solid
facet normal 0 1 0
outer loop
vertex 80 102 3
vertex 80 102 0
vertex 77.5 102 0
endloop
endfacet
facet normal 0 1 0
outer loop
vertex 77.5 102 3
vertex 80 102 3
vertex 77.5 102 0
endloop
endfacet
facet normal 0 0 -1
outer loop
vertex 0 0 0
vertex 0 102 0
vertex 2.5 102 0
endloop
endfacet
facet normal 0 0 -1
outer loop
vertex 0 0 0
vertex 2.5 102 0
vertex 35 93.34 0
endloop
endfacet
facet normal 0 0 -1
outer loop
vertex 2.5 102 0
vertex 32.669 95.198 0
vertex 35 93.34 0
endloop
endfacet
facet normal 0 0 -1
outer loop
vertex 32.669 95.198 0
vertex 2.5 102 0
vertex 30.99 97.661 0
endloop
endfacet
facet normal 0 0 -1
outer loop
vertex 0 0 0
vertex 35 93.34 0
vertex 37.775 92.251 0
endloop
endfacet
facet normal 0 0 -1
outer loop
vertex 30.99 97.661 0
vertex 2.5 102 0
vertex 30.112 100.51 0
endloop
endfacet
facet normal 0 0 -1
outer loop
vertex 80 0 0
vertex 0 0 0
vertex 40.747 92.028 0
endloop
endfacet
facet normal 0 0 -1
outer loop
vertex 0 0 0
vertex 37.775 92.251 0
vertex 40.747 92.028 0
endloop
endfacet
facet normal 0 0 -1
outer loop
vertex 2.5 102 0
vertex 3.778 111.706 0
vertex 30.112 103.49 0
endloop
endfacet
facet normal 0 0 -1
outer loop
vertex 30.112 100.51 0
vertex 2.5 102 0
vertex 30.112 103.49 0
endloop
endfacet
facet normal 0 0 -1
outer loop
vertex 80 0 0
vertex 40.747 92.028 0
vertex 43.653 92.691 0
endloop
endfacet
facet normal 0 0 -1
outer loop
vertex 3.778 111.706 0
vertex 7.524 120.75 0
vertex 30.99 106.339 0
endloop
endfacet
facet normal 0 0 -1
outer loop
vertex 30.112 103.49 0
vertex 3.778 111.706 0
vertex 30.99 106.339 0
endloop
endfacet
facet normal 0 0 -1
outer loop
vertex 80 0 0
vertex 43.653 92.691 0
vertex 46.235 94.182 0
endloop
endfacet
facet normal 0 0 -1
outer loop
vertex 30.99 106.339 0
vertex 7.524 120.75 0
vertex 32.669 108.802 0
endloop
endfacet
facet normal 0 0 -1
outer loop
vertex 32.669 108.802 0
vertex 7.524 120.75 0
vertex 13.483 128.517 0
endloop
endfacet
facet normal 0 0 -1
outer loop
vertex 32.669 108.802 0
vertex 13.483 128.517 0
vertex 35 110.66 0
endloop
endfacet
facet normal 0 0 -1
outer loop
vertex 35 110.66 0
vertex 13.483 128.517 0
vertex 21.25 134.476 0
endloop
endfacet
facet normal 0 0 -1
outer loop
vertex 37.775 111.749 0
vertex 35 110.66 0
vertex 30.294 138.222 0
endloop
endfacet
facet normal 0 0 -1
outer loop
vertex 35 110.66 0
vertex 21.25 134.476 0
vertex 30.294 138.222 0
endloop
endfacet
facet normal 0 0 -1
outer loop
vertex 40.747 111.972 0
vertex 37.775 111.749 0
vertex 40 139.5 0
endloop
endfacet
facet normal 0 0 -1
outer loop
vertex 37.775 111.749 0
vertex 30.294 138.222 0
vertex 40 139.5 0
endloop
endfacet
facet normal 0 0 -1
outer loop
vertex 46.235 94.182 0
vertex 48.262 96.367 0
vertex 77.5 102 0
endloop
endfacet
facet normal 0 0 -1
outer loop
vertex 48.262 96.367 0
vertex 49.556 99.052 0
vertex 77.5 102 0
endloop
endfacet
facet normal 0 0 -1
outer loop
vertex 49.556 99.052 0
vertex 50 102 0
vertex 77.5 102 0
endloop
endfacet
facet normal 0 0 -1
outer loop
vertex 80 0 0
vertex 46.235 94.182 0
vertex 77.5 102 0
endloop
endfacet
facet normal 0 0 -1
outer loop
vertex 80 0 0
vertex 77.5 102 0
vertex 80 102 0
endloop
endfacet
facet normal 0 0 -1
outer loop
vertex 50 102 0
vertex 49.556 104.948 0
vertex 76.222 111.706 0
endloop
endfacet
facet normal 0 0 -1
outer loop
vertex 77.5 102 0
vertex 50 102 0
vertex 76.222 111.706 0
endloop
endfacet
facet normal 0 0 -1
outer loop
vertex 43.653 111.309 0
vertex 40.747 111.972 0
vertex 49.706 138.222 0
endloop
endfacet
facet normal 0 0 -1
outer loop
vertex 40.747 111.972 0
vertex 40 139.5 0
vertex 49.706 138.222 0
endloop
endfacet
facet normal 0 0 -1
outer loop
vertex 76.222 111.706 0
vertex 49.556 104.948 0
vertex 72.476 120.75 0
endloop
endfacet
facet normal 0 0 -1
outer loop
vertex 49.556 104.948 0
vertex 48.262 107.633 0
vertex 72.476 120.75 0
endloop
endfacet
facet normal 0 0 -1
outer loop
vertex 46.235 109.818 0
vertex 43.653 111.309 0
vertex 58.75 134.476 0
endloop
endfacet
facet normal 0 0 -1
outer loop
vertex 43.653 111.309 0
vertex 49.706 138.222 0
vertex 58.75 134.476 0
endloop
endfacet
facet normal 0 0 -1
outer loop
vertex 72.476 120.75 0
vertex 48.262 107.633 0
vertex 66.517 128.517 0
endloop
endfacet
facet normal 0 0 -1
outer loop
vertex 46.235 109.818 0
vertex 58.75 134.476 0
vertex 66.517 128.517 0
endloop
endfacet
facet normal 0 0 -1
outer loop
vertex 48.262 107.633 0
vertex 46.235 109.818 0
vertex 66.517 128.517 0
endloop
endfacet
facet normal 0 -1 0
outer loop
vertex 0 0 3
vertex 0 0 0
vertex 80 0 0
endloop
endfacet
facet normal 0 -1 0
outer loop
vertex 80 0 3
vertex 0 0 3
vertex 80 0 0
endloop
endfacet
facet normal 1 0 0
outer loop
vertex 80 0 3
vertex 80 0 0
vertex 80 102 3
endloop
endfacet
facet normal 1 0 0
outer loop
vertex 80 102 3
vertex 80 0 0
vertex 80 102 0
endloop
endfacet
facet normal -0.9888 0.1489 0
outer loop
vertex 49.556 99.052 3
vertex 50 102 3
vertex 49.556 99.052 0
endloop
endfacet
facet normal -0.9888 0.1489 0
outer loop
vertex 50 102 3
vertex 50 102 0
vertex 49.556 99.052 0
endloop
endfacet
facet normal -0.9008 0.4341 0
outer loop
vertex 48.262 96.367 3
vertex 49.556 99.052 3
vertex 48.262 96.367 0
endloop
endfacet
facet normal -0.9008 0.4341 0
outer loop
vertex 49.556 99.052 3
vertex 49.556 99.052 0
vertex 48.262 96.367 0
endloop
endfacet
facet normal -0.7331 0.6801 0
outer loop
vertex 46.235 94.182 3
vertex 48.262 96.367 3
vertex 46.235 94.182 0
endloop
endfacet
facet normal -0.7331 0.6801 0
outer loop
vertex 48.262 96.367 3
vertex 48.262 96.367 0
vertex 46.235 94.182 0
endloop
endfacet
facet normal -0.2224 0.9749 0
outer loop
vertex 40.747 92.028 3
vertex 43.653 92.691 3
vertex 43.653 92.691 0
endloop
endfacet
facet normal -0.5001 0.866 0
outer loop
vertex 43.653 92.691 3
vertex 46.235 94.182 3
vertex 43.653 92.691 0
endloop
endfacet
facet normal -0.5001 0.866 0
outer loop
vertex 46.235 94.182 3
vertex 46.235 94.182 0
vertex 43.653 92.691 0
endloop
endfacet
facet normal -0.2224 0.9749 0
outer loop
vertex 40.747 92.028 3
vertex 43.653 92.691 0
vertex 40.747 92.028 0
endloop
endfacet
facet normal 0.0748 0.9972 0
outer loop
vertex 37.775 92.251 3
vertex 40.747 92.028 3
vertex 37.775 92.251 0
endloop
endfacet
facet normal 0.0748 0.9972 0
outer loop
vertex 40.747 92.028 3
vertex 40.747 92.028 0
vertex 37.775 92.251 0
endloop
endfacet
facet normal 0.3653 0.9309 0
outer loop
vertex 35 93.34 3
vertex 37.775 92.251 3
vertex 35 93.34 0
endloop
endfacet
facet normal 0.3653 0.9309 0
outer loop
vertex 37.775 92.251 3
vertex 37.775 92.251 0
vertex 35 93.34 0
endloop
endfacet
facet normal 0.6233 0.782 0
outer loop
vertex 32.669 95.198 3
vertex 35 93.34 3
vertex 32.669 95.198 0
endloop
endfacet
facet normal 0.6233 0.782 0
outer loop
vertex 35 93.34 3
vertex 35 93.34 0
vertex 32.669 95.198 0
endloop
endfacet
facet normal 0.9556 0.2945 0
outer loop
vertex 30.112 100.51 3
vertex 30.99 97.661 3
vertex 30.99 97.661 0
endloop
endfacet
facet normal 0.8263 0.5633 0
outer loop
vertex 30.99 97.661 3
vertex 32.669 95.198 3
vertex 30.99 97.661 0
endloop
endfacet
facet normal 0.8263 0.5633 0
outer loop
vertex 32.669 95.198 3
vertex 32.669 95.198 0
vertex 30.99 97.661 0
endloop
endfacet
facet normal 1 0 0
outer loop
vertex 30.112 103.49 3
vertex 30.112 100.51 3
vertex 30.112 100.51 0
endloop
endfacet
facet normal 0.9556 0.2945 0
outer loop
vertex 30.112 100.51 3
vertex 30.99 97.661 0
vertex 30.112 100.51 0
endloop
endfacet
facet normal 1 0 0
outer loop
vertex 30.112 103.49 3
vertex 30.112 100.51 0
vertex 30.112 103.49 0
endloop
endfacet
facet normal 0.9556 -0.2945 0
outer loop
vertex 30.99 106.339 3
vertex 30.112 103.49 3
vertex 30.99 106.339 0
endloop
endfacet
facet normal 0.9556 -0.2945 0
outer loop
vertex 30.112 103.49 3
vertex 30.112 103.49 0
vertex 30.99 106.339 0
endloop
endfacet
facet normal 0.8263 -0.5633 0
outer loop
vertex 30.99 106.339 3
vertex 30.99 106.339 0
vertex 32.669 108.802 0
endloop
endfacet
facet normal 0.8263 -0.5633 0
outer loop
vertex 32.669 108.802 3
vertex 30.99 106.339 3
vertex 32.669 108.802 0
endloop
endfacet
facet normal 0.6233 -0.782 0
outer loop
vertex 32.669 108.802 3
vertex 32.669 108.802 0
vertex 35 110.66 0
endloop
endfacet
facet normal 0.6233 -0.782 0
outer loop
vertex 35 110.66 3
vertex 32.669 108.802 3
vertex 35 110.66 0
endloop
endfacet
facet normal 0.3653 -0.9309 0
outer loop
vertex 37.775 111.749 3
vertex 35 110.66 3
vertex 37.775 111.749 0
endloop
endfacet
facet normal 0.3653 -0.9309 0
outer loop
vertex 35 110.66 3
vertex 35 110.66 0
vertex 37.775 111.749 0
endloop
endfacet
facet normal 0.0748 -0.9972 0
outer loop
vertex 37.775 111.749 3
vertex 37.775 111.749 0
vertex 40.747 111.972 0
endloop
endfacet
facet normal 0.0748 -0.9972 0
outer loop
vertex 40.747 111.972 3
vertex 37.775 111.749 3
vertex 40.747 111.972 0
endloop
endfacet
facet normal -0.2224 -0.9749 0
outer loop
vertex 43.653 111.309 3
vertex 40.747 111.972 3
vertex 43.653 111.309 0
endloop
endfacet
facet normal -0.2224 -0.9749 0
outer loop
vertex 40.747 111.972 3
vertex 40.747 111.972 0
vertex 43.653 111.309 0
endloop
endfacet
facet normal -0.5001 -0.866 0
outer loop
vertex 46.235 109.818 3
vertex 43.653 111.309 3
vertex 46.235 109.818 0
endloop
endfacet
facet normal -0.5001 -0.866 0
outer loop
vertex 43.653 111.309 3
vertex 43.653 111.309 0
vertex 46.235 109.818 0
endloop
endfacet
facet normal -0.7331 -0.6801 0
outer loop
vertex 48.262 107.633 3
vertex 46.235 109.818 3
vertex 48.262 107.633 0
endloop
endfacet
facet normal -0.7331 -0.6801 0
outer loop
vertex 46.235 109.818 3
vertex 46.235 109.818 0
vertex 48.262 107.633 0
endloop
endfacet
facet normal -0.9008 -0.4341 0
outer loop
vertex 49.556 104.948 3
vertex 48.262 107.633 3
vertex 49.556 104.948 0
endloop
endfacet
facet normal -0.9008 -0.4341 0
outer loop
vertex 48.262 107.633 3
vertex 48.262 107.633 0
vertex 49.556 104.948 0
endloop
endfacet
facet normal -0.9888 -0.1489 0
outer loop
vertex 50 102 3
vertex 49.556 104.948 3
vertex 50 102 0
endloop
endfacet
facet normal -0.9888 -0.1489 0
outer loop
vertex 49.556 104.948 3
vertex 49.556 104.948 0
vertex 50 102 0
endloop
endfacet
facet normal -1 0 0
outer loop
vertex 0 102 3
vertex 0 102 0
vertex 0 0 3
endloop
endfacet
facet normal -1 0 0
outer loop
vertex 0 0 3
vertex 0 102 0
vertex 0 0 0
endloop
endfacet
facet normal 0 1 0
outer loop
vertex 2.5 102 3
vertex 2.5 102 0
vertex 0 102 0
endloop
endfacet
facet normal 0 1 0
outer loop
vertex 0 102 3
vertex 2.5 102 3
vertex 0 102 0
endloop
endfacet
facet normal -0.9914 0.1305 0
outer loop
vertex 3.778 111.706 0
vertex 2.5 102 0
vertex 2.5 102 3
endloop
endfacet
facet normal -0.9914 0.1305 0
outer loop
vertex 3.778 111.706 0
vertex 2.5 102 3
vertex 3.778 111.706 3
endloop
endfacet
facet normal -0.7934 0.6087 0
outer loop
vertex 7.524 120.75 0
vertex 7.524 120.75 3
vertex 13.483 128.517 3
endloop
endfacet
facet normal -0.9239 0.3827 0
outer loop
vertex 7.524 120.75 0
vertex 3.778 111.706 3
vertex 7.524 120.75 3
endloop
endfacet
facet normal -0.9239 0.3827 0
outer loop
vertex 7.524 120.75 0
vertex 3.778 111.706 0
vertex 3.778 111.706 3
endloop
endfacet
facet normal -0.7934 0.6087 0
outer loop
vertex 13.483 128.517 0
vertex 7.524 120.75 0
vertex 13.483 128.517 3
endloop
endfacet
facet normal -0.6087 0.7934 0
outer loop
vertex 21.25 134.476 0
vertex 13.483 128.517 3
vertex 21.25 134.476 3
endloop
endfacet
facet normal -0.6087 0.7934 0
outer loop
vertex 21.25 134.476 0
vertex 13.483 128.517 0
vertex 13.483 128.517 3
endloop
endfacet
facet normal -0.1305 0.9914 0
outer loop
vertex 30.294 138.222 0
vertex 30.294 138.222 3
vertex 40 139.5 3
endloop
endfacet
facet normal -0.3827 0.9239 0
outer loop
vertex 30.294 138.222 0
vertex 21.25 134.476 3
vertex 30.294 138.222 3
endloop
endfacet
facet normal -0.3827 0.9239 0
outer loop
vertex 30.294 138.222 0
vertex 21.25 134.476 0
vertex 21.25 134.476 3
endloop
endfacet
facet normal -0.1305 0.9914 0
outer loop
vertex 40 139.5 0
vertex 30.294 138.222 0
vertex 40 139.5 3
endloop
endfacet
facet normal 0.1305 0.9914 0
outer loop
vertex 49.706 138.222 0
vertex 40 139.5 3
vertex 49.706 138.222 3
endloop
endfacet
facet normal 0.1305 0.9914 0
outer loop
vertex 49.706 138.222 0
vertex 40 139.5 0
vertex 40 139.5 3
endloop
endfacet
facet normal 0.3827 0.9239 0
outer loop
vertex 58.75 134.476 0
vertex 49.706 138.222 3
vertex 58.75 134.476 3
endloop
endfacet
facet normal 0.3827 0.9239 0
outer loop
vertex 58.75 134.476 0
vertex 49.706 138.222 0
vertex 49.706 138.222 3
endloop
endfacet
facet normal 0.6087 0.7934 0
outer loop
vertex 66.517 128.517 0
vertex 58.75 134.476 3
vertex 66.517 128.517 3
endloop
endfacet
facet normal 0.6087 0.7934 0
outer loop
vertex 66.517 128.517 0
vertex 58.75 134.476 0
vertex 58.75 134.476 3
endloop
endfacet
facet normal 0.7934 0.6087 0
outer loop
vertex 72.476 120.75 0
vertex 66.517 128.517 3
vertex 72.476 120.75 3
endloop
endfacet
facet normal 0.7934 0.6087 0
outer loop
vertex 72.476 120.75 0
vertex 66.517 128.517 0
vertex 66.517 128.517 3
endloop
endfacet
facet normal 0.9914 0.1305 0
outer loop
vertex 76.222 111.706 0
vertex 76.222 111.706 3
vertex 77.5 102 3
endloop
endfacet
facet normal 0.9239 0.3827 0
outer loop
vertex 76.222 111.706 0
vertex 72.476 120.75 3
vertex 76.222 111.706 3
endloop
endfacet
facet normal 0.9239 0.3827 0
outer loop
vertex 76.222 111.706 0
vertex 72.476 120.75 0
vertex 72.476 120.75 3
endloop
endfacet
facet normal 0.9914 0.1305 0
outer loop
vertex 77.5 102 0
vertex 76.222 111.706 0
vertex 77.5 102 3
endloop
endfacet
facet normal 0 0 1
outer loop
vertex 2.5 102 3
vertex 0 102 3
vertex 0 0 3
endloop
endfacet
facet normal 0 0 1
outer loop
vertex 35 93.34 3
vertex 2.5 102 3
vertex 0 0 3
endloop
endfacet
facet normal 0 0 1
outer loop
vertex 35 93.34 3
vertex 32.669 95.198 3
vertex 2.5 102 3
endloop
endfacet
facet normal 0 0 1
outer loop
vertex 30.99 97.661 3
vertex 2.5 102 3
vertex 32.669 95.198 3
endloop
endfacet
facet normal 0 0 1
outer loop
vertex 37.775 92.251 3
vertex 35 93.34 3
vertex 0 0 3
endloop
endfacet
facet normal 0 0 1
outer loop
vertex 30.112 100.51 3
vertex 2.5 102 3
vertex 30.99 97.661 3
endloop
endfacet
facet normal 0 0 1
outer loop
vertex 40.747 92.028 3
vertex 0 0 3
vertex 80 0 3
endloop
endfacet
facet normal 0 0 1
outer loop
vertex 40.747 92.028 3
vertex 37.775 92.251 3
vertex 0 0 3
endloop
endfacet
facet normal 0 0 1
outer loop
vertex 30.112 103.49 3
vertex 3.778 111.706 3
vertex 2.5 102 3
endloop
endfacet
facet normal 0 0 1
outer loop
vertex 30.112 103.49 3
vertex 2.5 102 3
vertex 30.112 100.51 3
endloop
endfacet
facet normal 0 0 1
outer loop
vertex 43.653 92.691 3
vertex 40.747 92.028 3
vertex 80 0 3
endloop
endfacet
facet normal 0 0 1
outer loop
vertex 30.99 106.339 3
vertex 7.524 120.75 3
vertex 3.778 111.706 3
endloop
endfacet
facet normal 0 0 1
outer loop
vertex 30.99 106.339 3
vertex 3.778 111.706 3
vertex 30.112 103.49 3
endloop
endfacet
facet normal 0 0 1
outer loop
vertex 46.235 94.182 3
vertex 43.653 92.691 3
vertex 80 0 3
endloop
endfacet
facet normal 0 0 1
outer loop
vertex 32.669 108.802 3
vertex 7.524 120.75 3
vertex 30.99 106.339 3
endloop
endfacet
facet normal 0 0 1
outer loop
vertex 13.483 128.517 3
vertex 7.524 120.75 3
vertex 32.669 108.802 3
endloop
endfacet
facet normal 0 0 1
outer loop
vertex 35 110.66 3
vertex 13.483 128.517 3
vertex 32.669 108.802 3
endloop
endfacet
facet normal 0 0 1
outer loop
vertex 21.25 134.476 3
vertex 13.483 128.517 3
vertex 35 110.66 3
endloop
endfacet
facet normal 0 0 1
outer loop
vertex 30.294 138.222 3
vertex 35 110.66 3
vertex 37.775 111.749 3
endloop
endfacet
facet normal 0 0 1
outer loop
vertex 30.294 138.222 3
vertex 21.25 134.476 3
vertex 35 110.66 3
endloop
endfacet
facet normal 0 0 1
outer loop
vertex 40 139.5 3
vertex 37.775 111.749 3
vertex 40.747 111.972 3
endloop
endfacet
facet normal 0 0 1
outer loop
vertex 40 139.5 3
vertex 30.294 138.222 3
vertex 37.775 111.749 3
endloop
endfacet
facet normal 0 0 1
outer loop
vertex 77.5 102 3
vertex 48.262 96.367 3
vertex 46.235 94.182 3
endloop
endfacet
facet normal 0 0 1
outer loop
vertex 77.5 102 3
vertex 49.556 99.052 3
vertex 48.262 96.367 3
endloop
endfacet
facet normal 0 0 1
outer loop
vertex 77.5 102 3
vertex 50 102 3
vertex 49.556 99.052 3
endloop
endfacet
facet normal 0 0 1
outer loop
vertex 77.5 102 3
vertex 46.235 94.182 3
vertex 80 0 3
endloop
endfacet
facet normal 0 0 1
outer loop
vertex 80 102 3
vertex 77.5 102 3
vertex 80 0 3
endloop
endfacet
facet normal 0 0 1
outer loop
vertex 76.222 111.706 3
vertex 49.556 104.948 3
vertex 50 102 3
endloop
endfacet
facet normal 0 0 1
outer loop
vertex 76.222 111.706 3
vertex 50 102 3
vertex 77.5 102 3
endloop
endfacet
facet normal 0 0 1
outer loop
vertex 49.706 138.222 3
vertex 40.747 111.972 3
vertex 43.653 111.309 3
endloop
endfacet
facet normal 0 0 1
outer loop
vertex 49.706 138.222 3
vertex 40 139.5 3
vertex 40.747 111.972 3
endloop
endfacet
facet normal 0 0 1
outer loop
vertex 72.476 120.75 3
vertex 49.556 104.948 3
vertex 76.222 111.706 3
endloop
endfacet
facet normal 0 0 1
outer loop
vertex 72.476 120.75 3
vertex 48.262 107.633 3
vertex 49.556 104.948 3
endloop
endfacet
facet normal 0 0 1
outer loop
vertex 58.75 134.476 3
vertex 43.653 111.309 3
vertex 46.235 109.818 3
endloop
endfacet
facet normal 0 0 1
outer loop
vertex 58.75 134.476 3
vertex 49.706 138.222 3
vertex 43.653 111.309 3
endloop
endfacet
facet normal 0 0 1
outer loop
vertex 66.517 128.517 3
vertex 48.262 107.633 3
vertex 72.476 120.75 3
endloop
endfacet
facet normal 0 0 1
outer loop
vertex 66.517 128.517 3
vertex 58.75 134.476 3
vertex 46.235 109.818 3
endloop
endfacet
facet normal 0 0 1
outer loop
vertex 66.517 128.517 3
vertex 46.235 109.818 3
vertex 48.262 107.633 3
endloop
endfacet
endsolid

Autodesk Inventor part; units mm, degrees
ref_plane "YZ Plane" through (0, 0, 0) normal (1, 0, 0) x (0, 1, 0)
ref_plane "XZ Plane" through (0, 0, 0) normal (0, 1, 0) x (-1, 0, 0)
ref_plane "XY Plane" through (0, 0, 0) normal (0, 0, 1) x (1, 0, 0)
sketch "Эскиз3" plane through (0, 0, 0) normal (0, 0, 1) x (1, 0, 0)
  line L0 (0, 0) -> (80, 0)
  line L1 (80, 0) -> (80, 102)
  line L2 (0, 102) -> (0, 0)
  circle A0 centre (40, 102) radius 10
  arc A1 (77.5, 102) -> (2.5, 102) centre (40, 102) ccw
  line L3 (80, 102) -> (77.5, 102)
  line L4 (2.5, 102) -> (0, 102)
  dimension "d8" = 102
  dimension "d9" = 80
  dimension "d10" = 20
  dimension "d11" = 75
extrude "Выдавливание3" add sketch "Эскиз3" along normal blind 3
equation "\"d9\" = width_coxa"
equation "\"d10\" = d_main_shaft"
equation "\"d6\" = thickness_steel"
equation "\"tolerance_plazma\" = 0.1"
equation "\"thickness_steel\" = 3"
equation "\"d_main_screw_holes\" = 6.1"
equation "\"d_main_shaft\" = 20"
equation "\"thickness_profile_tibea\" = 4"
equation "\"thickness_profile_femur\" = 3"
equation "\"width_shaft_shift\" = 35"
equation "\"width_flattened_surface\" = 12"
equation "\"width_coxa\" = 80"
properties part number "coxa_upper_steel" material "Сталь"
